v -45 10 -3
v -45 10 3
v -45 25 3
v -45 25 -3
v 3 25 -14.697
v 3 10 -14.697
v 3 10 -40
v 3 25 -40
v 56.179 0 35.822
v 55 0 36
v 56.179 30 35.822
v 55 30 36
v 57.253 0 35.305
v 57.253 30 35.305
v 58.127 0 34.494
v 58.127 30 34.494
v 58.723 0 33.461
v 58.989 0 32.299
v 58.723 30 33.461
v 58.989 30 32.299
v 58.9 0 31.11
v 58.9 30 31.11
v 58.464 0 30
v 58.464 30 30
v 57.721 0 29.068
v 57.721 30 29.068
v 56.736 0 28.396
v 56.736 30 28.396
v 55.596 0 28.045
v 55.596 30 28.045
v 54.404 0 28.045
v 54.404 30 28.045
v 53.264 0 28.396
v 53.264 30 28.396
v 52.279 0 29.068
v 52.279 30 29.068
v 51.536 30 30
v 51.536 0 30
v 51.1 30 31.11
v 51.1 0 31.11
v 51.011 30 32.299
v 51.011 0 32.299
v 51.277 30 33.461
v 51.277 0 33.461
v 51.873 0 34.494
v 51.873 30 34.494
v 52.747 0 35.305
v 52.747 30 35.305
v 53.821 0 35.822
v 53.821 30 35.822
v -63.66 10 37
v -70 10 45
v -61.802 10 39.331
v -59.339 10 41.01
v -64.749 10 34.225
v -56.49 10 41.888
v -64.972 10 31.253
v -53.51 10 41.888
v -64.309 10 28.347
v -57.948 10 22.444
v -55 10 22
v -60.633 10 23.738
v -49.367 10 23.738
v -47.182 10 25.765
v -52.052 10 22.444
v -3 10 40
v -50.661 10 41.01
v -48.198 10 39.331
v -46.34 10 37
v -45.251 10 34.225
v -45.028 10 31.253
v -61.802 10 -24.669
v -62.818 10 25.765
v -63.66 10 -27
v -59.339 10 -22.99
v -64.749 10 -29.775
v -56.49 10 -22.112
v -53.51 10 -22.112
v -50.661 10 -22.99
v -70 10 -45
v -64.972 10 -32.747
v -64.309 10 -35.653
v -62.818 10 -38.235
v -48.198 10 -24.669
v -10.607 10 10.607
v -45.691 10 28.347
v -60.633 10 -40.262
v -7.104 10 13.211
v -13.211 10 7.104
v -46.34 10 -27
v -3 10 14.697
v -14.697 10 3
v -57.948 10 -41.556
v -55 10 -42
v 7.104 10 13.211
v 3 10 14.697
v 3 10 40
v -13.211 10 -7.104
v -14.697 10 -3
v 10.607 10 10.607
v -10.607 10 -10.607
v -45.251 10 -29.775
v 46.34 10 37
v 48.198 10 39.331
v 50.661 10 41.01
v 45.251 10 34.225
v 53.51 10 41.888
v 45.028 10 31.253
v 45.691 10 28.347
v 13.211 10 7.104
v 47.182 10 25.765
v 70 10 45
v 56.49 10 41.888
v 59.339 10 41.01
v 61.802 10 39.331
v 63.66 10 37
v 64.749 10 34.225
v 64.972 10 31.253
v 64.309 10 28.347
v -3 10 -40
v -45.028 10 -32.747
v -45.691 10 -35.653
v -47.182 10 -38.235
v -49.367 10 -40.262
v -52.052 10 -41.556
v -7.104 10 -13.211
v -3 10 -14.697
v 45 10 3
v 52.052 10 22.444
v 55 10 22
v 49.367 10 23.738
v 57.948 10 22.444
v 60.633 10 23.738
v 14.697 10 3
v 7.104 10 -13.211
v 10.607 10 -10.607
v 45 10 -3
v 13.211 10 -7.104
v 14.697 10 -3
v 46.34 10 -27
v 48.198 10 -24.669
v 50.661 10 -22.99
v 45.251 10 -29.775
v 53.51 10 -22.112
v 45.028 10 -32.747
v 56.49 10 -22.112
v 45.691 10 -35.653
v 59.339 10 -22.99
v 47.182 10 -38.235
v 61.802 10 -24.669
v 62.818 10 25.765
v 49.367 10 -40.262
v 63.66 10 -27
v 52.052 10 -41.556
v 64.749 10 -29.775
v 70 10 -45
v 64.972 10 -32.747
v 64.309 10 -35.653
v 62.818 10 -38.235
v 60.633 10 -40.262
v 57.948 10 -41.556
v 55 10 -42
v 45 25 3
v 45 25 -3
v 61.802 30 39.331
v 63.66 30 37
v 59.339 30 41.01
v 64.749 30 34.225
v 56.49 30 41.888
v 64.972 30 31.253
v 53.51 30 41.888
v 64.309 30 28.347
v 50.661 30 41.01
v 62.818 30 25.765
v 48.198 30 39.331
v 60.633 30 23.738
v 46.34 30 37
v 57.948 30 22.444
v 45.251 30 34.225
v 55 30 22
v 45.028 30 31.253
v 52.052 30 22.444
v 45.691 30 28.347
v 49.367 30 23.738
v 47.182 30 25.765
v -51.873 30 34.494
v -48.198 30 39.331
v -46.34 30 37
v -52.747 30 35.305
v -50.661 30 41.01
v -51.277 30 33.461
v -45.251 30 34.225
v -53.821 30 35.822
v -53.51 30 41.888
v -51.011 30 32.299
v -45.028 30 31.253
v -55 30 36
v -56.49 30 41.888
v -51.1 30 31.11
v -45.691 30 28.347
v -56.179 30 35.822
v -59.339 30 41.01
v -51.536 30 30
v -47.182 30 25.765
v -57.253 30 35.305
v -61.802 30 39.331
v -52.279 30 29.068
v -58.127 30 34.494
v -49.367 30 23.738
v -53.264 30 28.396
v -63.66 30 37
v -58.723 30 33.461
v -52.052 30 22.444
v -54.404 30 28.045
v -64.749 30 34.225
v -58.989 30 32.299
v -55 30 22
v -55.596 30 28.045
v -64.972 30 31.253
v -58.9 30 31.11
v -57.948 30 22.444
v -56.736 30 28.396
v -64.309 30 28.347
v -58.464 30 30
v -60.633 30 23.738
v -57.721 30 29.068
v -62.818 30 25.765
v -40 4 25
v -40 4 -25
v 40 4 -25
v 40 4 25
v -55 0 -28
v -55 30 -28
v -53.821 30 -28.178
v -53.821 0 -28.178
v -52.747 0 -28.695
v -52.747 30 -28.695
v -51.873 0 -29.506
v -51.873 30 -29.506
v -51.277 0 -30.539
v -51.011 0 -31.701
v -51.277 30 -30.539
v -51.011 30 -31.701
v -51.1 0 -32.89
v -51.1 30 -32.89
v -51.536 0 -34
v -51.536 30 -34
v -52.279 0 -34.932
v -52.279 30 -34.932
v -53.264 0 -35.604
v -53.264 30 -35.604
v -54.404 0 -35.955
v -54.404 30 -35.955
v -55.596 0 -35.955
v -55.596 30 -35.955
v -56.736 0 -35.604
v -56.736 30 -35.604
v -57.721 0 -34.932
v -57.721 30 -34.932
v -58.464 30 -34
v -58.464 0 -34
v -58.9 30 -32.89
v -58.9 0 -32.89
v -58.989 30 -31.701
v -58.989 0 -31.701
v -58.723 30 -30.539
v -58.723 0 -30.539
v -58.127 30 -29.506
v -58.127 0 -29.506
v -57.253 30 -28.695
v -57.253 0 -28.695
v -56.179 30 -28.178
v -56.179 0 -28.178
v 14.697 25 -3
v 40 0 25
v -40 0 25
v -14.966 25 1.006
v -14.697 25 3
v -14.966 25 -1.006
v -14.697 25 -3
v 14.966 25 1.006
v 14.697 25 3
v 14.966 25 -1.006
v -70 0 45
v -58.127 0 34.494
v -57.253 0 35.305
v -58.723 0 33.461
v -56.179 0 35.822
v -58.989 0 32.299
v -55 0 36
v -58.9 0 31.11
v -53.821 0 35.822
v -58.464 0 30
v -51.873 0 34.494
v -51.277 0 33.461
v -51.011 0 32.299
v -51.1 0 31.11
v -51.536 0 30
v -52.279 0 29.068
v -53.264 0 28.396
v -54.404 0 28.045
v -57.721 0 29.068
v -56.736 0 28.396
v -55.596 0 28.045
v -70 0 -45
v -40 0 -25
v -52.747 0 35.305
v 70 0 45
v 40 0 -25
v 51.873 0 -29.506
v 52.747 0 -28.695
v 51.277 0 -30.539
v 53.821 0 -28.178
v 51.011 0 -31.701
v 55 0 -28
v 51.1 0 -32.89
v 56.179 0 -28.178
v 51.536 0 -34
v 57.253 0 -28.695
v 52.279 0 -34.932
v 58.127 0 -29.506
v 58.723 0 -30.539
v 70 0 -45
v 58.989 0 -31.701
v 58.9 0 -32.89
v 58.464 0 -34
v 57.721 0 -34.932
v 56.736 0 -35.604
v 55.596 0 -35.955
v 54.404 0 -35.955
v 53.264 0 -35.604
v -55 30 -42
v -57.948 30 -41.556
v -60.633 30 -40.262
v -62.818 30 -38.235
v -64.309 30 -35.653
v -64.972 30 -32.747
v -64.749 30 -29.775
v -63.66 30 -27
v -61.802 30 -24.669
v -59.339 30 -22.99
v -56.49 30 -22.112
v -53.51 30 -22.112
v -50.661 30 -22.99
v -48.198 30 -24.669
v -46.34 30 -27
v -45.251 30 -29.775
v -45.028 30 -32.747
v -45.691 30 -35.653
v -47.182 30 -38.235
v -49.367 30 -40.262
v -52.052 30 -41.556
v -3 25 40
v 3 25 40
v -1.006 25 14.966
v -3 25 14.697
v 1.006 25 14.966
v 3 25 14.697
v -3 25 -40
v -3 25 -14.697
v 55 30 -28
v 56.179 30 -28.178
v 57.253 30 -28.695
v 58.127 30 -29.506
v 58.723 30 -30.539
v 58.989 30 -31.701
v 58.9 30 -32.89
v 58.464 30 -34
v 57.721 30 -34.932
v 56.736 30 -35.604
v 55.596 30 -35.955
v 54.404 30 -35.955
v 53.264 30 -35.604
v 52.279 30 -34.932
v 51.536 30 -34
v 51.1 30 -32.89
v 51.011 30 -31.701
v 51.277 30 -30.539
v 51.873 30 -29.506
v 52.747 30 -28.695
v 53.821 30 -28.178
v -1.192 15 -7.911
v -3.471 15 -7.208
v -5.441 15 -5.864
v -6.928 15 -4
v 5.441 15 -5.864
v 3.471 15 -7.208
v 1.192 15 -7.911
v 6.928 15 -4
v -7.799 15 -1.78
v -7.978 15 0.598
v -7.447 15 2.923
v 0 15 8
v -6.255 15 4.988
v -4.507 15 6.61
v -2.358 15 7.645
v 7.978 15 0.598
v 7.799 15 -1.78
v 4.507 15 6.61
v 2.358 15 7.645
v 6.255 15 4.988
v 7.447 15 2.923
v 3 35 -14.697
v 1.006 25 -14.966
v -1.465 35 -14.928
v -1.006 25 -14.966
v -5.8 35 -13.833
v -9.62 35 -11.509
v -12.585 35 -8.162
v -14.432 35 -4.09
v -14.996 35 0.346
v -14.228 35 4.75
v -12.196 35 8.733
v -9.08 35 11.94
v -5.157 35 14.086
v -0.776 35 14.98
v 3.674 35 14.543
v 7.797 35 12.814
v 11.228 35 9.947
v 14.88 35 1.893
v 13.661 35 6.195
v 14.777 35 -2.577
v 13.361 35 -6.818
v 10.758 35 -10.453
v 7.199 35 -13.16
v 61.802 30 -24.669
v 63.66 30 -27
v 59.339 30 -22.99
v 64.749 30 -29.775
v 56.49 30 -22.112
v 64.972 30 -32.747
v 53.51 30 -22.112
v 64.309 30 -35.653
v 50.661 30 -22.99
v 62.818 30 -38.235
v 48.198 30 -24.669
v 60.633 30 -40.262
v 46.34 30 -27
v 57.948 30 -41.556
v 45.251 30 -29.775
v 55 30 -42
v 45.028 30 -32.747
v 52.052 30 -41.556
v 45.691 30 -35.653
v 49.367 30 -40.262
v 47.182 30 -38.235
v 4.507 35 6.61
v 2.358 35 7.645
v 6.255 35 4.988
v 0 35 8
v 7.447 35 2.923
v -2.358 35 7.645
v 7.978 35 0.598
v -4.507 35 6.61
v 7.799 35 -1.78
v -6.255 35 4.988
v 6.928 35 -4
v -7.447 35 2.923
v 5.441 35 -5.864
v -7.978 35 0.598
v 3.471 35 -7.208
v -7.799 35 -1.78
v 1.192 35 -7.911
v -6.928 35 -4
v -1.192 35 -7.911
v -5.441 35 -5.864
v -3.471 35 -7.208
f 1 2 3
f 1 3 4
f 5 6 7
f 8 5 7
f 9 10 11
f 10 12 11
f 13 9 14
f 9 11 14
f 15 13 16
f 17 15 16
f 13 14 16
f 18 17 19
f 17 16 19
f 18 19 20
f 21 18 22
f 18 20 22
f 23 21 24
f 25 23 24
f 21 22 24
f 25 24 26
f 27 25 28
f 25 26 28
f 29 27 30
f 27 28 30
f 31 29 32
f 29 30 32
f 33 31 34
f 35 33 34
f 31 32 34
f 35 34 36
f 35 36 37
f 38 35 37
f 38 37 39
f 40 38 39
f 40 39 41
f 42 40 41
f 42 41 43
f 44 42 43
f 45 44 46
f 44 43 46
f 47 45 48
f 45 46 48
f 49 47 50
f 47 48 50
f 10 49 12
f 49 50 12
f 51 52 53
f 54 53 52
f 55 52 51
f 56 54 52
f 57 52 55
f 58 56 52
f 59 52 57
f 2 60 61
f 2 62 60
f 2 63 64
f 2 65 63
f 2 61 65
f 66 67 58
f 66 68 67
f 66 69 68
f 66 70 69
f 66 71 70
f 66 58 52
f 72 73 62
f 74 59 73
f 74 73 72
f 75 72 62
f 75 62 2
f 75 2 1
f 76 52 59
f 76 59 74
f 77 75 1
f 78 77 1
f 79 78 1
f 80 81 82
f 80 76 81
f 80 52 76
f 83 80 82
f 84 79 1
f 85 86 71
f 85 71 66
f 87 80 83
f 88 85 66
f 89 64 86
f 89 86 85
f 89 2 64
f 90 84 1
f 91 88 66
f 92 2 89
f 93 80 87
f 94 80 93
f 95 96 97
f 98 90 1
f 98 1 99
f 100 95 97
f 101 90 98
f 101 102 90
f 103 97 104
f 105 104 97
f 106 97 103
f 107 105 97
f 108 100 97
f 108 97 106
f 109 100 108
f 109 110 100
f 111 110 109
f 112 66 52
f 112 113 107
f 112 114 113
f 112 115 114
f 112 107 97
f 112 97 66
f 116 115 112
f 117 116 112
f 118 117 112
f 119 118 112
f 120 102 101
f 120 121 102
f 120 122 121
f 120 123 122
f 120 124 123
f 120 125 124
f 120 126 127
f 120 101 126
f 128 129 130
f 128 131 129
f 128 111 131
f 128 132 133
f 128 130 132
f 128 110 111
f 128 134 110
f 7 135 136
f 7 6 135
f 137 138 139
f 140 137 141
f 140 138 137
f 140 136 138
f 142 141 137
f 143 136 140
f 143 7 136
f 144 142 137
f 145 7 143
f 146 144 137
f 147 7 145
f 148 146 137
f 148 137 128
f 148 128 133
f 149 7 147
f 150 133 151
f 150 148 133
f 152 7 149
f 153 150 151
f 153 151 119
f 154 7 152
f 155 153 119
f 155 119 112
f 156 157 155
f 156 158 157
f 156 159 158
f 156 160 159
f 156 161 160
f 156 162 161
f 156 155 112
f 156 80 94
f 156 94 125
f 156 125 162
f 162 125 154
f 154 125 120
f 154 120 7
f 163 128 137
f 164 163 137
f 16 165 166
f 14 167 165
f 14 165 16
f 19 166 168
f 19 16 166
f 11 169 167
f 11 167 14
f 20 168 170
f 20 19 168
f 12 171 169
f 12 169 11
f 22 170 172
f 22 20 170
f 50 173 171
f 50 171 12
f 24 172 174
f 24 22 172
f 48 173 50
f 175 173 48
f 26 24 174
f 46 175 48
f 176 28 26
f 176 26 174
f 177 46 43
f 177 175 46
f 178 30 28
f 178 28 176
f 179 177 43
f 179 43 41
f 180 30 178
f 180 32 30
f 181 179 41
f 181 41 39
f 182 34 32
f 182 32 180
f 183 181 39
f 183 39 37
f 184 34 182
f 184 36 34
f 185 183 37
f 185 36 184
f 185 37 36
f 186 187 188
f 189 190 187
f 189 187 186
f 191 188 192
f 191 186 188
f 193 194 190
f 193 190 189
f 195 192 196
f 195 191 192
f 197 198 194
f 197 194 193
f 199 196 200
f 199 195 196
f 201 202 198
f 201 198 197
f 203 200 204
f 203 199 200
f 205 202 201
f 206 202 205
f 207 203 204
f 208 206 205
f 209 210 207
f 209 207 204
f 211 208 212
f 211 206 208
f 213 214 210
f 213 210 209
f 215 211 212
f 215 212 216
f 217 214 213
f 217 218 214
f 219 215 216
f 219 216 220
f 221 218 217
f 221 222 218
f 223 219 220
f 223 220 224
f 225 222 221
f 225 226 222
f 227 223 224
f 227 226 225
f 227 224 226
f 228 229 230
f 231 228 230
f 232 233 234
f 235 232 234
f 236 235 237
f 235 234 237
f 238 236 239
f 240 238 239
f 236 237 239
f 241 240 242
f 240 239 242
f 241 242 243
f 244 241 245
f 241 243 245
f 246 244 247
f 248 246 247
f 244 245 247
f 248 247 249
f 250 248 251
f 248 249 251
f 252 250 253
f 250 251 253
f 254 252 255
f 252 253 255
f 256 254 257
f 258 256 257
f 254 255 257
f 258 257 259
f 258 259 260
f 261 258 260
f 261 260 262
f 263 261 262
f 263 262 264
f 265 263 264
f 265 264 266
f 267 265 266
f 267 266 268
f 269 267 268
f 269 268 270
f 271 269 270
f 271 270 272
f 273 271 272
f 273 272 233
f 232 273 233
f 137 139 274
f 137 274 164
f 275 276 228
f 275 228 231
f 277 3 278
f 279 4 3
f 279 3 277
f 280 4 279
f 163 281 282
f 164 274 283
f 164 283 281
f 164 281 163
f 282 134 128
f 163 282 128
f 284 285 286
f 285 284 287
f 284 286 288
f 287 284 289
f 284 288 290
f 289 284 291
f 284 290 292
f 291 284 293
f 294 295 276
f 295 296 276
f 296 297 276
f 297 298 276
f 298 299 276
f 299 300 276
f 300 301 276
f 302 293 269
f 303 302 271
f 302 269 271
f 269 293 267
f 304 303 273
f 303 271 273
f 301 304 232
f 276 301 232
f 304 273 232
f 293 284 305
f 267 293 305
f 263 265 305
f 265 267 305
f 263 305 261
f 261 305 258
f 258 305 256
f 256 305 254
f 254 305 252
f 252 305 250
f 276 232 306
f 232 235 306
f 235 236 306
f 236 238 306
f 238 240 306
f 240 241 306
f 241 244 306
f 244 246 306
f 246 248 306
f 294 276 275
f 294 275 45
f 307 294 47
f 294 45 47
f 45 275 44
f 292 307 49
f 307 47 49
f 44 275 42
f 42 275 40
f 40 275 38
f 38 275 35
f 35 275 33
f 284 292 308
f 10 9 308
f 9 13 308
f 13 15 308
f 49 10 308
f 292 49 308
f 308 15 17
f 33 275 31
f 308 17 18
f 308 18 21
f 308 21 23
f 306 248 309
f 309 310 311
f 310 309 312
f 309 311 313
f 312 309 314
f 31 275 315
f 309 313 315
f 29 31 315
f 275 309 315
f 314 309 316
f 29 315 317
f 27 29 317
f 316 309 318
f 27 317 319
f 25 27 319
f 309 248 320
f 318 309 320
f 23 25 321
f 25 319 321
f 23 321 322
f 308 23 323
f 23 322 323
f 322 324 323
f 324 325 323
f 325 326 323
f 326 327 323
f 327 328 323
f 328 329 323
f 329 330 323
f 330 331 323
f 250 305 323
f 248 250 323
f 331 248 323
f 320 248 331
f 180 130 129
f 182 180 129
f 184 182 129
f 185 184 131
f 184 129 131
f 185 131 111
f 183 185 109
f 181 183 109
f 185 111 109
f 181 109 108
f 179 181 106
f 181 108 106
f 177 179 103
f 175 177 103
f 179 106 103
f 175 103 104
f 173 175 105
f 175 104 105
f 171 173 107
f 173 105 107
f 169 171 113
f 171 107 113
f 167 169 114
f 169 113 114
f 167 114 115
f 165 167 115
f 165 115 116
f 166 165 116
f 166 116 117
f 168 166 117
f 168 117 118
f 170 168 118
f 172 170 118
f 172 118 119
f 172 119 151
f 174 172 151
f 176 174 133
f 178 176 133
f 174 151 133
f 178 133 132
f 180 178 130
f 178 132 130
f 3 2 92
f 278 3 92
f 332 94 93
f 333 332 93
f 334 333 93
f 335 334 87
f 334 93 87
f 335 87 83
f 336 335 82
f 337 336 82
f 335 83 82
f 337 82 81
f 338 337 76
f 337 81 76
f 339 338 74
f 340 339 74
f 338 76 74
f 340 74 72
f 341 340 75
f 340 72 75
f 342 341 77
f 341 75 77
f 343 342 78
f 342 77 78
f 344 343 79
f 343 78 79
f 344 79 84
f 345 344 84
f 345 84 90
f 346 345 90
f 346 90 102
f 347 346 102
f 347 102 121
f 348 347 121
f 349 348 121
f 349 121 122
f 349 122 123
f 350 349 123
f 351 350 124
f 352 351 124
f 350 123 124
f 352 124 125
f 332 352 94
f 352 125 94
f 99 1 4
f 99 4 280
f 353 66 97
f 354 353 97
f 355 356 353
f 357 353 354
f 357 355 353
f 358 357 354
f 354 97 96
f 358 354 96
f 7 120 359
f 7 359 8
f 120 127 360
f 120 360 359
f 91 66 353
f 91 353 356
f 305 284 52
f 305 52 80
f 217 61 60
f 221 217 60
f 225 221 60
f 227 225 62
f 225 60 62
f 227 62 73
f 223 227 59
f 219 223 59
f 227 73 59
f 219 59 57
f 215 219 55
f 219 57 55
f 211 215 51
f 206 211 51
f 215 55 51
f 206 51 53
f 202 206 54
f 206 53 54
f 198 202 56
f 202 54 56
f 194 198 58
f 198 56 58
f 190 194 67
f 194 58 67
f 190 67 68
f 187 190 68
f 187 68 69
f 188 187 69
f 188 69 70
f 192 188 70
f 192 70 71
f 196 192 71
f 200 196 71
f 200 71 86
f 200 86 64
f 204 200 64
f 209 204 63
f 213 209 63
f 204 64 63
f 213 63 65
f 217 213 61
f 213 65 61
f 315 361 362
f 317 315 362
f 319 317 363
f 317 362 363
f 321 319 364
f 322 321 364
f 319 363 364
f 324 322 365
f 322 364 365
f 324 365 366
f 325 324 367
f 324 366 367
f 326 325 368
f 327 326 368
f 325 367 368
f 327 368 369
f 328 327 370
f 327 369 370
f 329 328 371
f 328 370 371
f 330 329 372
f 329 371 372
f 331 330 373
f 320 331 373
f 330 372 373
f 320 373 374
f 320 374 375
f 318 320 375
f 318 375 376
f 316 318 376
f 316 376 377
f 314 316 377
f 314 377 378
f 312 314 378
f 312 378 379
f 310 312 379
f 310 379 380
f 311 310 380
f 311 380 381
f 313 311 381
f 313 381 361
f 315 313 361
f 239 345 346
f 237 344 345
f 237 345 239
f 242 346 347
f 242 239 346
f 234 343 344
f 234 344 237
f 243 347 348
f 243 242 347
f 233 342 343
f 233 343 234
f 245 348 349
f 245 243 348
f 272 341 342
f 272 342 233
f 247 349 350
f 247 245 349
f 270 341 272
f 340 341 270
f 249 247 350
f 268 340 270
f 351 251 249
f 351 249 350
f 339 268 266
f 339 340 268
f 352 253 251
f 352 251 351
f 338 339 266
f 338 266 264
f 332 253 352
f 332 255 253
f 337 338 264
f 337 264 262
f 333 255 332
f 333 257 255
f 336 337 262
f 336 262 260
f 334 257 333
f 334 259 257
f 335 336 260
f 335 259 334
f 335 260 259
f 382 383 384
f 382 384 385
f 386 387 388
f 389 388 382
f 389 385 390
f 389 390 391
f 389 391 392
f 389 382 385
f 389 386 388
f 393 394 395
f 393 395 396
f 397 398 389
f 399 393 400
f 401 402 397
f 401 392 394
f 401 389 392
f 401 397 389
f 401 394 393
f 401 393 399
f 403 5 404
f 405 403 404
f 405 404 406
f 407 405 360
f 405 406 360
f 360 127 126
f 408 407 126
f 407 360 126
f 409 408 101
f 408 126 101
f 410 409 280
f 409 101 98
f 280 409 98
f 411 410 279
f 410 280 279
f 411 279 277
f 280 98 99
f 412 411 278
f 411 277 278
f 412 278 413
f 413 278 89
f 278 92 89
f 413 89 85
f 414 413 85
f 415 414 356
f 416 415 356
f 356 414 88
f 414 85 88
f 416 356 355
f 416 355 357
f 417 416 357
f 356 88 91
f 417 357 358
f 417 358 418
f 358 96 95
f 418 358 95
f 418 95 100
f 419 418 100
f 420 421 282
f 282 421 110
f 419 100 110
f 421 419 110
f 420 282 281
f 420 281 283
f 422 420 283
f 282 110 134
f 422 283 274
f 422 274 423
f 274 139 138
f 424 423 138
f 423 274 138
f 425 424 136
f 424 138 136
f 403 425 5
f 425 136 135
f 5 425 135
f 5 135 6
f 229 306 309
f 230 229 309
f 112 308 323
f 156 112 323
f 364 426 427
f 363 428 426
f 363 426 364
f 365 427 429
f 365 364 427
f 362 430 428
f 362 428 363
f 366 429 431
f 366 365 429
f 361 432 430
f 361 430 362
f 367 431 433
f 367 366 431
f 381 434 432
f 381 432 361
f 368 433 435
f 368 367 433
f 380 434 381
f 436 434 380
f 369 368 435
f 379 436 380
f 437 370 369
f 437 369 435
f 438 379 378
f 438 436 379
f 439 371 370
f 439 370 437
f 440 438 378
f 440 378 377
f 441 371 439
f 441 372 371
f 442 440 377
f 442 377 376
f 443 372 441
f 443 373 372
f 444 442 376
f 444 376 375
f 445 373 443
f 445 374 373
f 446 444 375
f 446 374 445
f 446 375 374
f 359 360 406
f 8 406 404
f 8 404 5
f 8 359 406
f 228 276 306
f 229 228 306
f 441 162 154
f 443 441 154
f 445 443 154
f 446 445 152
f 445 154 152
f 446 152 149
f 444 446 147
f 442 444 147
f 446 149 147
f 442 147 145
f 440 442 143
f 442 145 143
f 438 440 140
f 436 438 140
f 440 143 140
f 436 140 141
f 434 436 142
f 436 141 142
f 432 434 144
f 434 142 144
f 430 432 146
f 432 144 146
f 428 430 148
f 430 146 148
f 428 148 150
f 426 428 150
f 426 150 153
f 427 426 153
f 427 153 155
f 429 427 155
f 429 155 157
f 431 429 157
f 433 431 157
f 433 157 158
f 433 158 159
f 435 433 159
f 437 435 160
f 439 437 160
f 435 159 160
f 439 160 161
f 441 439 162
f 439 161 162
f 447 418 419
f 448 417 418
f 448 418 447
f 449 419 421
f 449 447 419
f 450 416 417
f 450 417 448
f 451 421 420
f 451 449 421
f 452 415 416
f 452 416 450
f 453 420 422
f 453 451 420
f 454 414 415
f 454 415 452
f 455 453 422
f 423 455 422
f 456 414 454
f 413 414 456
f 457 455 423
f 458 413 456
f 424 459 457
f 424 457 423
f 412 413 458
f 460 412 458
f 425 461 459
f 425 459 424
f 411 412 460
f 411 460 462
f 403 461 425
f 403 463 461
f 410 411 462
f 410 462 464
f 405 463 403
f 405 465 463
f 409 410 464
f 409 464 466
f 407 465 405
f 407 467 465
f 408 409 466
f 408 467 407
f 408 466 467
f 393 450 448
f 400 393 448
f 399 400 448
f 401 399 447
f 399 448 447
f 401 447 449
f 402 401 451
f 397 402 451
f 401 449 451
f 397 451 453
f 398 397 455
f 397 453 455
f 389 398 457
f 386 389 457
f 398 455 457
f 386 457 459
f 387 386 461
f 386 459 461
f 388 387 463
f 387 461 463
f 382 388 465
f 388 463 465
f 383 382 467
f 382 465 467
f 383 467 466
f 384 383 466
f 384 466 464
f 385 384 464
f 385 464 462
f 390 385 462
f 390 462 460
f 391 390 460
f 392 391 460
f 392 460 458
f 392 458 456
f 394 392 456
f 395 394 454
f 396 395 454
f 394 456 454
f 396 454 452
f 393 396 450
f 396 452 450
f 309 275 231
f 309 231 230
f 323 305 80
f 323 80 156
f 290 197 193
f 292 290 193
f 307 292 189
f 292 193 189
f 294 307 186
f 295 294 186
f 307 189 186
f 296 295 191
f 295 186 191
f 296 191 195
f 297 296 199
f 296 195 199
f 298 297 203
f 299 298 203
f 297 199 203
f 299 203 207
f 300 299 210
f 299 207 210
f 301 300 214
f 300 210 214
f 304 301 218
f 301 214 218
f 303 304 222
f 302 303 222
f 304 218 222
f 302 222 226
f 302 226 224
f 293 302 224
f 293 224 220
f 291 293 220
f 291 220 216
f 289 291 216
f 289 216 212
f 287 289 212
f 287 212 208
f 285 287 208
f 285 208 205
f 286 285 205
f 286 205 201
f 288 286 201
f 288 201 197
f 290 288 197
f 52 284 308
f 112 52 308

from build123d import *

# Parameters (mm, degrees)
SKETCH_1_W          = 140
SKETCH_1_H          = 90
EXTRUDE_1_DEPTH     = 10
SKETCH_2_W          = 80
SKETCH_2_H          = 50
CUT_EXTRUDE_1_DEPTH = 4
SKETCH_3_W          = 90
SKETCH_3_H          = 6
EXTRUDE_2_DEPTH     = 15
SKETCH_4_W          = 6
SKETCH_4_H          = 80
EXTRUDE_3_DEPTH     = 15
SKETCH_5_R          = 10
EXTRUDE_4_DEPTH     = 20
SKETCH_6_R          = 15
EXTRUDE_5_DEPTH     = 25
SKETCH_7_R          = 4
CUT_EXTRUDE_2_DEPTH = 141
SKETCH_8_R          = 8
CUT_EXTRUDE_3_DEPTH = 20


with BuildPart() as part:
    # 草图1 → 凸台-拉伸1 (new body)
    with BuildSketch(Plane(origin=(0, 0, 0), x_dir=(1, 0, 0), z_dir=(0, 1, 0))):
        Rectangle(SKETCH_1_W, SKETCH_1_H)
    extrude(amount=EXTRUDE_1_DEPTH)

    # 草图2 → 切除-拉伸1 (cut)
    with BuildSketch(Plane(origin=(0, 0, 0), x_dir=(1, 0, 0), z_dir=(0, 1, 0))):
        Rectangle(SKETCH_2_W, SKETCH_2_H)
    extrude(amount=CUT_EXTRUDE_1_DEPTH, mode=Mode.SUBTRACT)

    # 草图3 → 凸台-拉伸2 (add)
    with BuildSketch(Plane(origin=(0, 10, 0), x_dir=(1, 0, 0), z_dir=(0, 1, 0))):
        Rectangle(SKETCH_3_W, SKETCH_3_H)
    extrude(amount=EXTRUDE_2_DEPTH)

    # 草图4 → 凸台-拉伸3 (add)
    with BuildSketch(Plane(origin=(0, 10, 0), x_dir=(1, 0, 0), z_dir=(0, 1, 0))):
        Rectangle(SKETCH_4_W, SKETCH_4_H)
    extrude(amount=EXTRUDE_3_DEPTH)

    # 草图5 → 凸台-拉伸4 (add)
    with BuildSketch(Plane(origin=(0, 10, 0), x_dir=(1, 0, 0), z_dir=(0, 1, 0))):
        with Locations(Location((-55, 32, 0), (0, 0, 90))):
            Circle(SKETCH_5_R)
        with Locations(Location((55, 32, 0), (0, 0, 90))):
            Circle(SKETCH_5_R)
        with Locations(Location((-55, -32, 0), (0, 0, 90))):
            Circle(SKETCH_5_R)
        with Locations(Location((55, -32, 0), (0, 0, 90))):
            Circle(SKETCH_5_R)
    extrude(amount=EXTRUDE_4_DEPTH)

    # 草图6 → 凸台-拉伸5 (add)
    with BuildSketch(Plane(origin=(0, 10, 0), x_dir=(1, 0, 0), z_dir=(0, 1, 0))):
        with Locations(Location((0, 0, 0), (0, 0, 78.463040967))):
            Circle(SKETCH_6_R)
    extrude(amount=EXTRUDE_5_DEPTH)

    # 草图7 → 切除-拉伸2 (cut, symmetric)
    with BuildSketch(Plane(origin=(0, 30, 0), x_dir=(1, 0, 0), z_dir=(0, 1, 0))):
        with Locations(Location((-55, 32, 0), (0, 0, 270))):
            Circle(SKETCH_7_R)
        with Locations(Location((55, 32, 0), (0, 0, 270))):
            Circle(SKETCH_7_R)
        with Locations(Location((-55, -32, 0), (0, 0, 270))):
            Circle(SKETCH_7_R)
        with Locations(Location((55, -32, 0), (0, 0, 270))):
            Circle(SKETCH_7_R)
    extrude(amount=CUT_EXTRUDE_2_DEPTH, both=True, mode=Mode.SUBTRACT)

    # 草图8 → 切除-拉伸3 (cut)
    with BuildSketch(Plane(origin=(0, 35, 0), x_dir=(1, 0, 0), z_dir=(0, 1, 0))):
        with Locations(Location((0, 0, 0), (0, 0, 270))):
            Circle(SKETCH_8_R)
    extrude(amount=-CUT_EXTRUDE_3_DEPTH, mode=Mode.SUBTRACT)


solid = part.part
